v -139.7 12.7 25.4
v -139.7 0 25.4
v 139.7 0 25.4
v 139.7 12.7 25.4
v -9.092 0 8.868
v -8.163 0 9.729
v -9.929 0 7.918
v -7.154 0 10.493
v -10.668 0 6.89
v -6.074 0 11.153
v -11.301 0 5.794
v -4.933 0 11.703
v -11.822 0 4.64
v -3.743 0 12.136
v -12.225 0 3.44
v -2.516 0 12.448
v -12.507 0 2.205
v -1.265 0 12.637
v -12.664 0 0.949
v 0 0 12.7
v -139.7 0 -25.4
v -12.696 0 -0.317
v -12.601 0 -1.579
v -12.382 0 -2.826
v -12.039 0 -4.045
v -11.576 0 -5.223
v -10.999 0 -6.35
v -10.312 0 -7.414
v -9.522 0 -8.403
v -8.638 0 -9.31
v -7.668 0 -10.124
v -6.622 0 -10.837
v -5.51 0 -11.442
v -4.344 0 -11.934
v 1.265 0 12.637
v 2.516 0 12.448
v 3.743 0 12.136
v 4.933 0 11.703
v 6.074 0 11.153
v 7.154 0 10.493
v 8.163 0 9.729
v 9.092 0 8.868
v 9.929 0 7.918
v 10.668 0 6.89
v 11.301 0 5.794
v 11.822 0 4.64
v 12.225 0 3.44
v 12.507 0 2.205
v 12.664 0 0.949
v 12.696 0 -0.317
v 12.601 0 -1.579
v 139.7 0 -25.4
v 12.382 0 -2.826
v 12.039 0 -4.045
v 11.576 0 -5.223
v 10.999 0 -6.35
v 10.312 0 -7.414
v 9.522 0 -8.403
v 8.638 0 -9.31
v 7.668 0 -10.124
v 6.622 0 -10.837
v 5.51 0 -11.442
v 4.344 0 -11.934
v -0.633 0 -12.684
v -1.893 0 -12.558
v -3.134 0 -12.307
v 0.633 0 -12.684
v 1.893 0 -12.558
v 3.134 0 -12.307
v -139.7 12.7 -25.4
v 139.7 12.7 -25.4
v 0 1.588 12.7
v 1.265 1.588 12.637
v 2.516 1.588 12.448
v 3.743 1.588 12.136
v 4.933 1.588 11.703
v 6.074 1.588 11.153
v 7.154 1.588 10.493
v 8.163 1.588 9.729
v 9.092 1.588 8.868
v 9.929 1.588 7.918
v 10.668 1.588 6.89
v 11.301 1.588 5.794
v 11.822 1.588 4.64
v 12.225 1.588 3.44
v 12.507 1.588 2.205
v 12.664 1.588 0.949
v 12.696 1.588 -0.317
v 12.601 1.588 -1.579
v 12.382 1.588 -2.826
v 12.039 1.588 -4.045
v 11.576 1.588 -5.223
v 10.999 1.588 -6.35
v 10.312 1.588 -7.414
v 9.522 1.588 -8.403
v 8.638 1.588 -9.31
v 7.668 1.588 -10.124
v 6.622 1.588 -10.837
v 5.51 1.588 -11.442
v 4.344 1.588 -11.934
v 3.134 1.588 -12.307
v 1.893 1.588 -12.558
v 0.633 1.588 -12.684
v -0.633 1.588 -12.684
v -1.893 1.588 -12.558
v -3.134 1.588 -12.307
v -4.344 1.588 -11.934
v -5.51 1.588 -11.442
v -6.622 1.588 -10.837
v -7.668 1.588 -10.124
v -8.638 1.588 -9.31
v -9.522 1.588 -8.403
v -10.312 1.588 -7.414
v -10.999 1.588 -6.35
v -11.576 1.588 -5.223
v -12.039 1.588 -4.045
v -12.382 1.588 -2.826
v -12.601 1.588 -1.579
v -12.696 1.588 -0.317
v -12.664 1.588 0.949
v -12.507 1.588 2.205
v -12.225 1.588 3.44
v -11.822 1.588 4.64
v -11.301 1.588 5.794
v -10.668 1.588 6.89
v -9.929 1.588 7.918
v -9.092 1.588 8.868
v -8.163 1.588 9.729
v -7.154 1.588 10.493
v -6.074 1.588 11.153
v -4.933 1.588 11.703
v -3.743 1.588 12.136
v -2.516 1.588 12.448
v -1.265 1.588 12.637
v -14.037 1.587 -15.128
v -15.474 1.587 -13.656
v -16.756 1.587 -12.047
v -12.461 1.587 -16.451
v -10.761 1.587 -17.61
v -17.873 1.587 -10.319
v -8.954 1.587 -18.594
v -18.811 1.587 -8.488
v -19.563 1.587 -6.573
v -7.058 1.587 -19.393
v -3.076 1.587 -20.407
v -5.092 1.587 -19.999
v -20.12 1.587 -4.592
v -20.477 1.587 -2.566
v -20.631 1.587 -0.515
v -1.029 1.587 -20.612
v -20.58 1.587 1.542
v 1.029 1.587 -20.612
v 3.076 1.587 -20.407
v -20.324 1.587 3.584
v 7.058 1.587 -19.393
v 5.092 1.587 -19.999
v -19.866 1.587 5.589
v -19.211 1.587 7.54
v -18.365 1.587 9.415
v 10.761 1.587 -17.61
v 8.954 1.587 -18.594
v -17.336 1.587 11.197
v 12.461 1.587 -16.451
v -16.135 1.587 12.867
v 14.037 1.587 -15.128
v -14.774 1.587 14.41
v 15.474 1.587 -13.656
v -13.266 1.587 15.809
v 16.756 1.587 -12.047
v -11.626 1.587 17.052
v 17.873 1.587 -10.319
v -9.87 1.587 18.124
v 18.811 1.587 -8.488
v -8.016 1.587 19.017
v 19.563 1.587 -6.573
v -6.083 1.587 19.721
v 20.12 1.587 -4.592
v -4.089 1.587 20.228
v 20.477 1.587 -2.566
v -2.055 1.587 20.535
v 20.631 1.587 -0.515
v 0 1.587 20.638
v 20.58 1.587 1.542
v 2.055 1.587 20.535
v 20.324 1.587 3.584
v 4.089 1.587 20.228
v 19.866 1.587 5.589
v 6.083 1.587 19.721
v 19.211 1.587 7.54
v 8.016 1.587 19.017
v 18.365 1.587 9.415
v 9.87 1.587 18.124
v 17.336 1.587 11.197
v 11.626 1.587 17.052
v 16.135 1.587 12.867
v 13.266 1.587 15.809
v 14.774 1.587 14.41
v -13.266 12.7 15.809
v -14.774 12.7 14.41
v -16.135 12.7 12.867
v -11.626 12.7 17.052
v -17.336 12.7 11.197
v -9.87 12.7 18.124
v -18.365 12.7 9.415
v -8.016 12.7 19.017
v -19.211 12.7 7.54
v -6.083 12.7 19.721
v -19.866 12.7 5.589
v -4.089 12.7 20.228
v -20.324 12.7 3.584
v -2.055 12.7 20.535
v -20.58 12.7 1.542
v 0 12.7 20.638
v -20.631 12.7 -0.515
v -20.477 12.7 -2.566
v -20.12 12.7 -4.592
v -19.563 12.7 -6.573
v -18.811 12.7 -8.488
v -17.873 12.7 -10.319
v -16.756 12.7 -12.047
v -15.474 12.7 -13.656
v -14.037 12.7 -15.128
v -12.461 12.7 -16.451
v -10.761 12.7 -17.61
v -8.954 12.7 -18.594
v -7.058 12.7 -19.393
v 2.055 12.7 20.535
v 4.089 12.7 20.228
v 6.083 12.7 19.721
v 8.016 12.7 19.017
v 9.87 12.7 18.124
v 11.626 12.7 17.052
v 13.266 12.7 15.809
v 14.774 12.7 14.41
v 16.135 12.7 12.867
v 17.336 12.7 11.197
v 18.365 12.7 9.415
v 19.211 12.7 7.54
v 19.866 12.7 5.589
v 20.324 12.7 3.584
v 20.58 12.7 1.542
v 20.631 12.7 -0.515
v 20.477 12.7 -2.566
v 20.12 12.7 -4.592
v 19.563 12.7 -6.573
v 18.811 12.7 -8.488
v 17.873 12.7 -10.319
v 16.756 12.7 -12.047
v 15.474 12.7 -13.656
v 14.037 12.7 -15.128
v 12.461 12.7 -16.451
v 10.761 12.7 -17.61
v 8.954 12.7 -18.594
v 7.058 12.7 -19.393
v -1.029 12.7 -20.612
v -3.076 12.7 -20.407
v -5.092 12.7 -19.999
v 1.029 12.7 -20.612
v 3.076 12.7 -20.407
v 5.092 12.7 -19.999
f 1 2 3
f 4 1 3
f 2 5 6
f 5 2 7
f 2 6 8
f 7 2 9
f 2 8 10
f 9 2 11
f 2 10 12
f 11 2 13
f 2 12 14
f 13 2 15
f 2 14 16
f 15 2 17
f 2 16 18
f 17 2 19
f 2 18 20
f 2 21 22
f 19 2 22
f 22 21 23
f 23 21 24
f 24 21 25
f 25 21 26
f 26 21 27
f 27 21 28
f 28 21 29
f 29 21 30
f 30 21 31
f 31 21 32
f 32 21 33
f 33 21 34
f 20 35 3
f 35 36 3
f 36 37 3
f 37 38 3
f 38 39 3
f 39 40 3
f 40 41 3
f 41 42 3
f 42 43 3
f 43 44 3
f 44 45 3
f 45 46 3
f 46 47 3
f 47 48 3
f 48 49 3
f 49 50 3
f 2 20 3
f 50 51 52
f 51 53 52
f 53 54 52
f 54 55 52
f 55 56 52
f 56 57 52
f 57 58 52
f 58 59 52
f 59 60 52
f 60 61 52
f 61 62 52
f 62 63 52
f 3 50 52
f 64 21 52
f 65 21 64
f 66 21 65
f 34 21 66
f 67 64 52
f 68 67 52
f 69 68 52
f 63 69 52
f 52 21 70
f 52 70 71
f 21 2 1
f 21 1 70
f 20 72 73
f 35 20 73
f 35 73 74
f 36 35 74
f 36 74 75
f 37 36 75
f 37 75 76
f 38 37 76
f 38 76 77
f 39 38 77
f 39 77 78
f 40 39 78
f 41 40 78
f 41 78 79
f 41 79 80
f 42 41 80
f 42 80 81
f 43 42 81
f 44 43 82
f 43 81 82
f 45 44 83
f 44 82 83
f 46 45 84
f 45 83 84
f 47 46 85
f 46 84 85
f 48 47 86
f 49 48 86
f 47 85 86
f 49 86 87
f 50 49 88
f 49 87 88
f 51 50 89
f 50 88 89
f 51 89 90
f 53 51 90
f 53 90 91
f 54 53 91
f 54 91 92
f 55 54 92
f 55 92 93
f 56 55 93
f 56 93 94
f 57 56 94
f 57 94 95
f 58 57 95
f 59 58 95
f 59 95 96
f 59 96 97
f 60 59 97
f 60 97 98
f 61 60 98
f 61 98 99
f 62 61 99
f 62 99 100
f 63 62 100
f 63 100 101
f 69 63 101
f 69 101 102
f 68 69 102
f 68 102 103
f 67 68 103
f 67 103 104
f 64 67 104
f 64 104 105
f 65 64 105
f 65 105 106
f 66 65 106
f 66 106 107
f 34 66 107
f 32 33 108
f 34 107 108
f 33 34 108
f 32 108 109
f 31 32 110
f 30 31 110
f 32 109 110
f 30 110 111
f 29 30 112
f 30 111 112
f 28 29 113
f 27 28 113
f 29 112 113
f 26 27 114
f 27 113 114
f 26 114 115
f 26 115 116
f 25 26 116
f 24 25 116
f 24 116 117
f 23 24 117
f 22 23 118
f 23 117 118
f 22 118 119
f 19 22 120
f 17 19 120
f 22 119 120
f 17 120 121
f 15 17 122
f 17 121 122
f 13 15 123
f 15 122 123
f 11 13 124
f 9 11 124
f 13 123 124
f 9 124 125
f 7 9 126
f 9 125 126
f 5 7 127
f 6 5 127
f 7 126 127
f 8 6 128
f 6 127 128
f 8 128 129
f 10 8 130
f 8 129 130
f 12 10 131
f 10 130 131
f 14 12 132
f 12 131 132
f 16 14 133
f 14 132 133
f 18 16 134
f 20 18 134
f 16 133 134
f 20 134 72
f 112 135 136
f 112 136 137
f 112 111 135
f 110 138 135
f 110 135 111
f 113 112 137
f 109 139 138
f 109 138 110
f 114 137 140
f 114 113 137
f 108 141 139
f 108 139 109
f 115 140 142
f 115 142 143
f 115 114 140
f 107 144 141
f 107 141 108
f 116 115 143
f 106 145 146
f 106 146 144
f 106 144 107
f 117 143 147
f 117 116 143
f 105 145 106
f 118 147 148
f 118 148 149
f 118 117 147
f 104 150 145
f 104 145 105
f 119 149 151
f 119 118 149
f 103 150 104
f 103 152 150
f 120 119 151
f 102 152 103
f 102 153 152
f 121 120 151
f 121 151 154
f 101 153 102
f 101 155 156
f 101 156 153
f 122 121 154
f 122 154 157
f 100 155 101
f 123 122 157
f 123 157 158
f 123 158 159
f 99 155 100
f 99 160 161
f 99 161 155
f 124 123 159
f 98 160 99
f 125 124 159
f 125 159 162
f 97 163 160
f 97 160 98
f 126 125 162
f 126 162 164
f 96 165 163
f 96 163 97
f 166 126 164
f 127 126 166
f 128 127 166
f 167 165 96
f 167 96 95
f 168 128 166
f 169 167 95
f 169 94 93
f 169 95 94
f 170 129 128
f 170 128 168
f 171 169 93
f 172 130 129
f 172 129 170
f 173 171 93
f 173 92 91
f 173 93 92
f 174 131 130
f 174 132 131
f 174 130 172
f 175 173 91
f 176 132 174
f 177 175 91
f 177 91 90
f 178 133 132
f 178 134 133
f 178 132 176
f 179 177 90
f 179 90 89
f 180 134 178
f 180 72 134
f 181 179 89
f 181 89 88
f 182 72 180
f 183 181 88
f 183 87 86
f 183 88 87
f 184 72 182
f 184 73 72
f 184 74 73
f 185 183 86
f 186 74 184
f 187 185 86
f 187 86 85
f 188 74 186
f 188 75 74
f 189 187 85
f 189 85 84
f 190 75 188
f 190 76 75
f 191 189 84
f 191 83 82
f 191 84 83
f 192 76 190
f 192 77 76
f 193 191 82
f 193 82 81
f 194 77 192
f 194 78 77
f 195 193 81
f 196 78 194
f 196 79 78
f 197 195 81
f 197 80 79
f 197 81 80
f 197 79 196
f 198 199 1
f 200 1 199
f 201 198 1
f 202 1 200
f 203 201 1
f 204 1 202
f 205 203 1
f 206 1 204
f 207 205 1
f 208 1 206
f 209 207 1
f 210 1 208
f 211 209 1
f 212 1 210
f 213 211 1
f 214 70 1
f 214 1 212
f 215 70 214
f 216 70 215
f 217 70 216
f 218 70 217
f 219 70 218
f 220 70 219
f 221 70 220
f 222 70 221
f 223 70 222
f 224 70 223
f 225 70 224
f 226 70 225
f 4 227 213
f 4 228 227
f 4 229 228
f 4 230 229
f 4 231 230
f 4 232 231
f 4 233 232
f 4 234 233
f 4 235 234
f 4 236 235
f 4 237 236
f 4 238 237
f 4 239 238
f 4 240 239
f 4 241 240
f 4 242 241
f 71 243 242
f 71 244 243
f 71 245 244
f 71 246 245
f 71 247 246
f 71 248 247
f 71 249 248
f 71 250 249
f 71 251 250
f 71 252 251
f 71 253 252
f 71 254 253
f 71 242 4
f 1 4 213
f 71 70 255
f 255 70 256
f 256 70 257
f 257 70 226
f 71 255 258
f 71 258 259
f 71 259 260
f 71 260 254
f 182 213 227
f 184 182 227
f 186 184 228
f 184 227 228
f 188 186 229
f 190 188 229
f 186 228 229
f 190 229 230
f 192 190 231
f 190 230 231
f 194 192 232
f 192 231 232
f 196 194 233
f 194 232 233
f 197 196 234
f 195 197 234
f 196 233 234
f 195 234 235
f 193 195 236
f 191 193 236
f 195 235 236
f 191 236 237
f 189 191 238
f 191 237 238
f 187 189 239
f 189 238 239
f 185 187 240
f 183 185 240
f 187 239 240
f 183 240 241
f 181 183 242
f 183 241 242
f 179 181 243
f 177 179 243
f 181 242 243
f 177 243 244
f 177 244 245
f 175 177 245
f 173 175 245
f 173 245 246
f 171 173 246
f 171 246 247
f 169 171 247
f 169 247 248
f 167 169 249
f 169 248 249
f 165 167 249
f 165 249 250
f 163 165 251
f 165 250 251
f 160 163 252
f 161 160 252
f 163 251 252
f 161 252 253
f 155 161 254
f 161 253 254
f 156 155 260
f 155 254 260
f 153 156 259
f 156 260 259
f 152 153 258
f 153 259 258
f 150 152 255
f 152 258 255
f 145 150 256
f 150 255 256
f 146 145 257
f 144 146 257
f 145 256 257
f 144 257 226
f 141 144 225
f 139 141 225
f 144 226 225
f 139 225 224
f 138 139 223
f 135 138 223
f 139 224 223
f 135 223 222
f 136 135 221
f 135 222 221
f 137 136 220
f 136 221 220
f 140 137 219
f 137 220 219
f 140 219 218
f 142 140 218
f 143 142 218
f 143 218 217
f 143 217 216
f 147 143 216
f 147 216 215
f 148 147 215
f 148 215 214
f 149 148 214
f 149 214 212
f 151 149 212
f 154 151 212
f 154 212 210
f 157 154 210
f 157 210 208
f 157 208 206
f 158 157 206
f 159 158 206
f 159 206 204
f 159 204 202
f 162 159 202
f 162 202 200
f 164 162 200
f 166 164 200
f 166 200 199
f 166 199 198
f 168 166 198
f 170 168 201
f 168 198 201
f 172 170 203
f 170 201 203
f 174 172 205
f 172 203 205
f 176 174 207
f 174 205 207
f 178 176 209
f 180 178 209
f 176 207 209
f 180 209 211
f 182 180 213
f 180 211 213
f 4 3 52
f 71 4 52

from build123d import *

# Parameters (mm, degrees)
SKETCH1_W           = 279.4
SKETCH1_H           = 50.8
BOSS_EXTRUDE1_DEPTH = 12.7
SKETCH2_R           = 20.6375
CUT_EXTRUDE1_DEPTH  = 11.1125
SKETCH3_R           = 12.7
CUT_EXTRUDE2_DEPTH  = 143.42449809


with BuildPart() as part:
    # Sketch1 → Boss-Extrude1 (new body)
    with BuildSketch(Plane(origin=(0, 0, 0), x_dir=(1, 0, 0), z_dir=(0, 1, 0))):
        Rectangle(SKETCH1_W, SKETCH1_H)
    extrude(amount=BOSS_EXTRUDE1_DEPTH)

    # Sketch2 → Cut-Extrude1 (cut)
    with BuildSketch(Plane(origin=(0, 12.7, 0), x_dir=(1, 0, 0), z_dir=(0, 1, 0))):
        with Locations(Location((0, 0, 0), (0, 0, 270))):
            Circle(SKETCH2_R)
    extrude(amount=-CUT_EXTRUDE1_DEPTH, mode=Mode.SUBTRACT)

    # Sketch3 → Cut-Extrude2 (cut, through all)
    with BuildSketch(Plane(origin=(0, 1.5875, 0), x_dir=(1, 0, 0), z_dir=(0, 1, 0))):
        with Locations(Location((0, 0, 0), (0, 0, 270))):
            Circle(SKETCH3_R)
    extrude(amount=-CUT_EXTRUDE2_DEPTH, mode=Mode.SUBTRACT)


solid = part.part
